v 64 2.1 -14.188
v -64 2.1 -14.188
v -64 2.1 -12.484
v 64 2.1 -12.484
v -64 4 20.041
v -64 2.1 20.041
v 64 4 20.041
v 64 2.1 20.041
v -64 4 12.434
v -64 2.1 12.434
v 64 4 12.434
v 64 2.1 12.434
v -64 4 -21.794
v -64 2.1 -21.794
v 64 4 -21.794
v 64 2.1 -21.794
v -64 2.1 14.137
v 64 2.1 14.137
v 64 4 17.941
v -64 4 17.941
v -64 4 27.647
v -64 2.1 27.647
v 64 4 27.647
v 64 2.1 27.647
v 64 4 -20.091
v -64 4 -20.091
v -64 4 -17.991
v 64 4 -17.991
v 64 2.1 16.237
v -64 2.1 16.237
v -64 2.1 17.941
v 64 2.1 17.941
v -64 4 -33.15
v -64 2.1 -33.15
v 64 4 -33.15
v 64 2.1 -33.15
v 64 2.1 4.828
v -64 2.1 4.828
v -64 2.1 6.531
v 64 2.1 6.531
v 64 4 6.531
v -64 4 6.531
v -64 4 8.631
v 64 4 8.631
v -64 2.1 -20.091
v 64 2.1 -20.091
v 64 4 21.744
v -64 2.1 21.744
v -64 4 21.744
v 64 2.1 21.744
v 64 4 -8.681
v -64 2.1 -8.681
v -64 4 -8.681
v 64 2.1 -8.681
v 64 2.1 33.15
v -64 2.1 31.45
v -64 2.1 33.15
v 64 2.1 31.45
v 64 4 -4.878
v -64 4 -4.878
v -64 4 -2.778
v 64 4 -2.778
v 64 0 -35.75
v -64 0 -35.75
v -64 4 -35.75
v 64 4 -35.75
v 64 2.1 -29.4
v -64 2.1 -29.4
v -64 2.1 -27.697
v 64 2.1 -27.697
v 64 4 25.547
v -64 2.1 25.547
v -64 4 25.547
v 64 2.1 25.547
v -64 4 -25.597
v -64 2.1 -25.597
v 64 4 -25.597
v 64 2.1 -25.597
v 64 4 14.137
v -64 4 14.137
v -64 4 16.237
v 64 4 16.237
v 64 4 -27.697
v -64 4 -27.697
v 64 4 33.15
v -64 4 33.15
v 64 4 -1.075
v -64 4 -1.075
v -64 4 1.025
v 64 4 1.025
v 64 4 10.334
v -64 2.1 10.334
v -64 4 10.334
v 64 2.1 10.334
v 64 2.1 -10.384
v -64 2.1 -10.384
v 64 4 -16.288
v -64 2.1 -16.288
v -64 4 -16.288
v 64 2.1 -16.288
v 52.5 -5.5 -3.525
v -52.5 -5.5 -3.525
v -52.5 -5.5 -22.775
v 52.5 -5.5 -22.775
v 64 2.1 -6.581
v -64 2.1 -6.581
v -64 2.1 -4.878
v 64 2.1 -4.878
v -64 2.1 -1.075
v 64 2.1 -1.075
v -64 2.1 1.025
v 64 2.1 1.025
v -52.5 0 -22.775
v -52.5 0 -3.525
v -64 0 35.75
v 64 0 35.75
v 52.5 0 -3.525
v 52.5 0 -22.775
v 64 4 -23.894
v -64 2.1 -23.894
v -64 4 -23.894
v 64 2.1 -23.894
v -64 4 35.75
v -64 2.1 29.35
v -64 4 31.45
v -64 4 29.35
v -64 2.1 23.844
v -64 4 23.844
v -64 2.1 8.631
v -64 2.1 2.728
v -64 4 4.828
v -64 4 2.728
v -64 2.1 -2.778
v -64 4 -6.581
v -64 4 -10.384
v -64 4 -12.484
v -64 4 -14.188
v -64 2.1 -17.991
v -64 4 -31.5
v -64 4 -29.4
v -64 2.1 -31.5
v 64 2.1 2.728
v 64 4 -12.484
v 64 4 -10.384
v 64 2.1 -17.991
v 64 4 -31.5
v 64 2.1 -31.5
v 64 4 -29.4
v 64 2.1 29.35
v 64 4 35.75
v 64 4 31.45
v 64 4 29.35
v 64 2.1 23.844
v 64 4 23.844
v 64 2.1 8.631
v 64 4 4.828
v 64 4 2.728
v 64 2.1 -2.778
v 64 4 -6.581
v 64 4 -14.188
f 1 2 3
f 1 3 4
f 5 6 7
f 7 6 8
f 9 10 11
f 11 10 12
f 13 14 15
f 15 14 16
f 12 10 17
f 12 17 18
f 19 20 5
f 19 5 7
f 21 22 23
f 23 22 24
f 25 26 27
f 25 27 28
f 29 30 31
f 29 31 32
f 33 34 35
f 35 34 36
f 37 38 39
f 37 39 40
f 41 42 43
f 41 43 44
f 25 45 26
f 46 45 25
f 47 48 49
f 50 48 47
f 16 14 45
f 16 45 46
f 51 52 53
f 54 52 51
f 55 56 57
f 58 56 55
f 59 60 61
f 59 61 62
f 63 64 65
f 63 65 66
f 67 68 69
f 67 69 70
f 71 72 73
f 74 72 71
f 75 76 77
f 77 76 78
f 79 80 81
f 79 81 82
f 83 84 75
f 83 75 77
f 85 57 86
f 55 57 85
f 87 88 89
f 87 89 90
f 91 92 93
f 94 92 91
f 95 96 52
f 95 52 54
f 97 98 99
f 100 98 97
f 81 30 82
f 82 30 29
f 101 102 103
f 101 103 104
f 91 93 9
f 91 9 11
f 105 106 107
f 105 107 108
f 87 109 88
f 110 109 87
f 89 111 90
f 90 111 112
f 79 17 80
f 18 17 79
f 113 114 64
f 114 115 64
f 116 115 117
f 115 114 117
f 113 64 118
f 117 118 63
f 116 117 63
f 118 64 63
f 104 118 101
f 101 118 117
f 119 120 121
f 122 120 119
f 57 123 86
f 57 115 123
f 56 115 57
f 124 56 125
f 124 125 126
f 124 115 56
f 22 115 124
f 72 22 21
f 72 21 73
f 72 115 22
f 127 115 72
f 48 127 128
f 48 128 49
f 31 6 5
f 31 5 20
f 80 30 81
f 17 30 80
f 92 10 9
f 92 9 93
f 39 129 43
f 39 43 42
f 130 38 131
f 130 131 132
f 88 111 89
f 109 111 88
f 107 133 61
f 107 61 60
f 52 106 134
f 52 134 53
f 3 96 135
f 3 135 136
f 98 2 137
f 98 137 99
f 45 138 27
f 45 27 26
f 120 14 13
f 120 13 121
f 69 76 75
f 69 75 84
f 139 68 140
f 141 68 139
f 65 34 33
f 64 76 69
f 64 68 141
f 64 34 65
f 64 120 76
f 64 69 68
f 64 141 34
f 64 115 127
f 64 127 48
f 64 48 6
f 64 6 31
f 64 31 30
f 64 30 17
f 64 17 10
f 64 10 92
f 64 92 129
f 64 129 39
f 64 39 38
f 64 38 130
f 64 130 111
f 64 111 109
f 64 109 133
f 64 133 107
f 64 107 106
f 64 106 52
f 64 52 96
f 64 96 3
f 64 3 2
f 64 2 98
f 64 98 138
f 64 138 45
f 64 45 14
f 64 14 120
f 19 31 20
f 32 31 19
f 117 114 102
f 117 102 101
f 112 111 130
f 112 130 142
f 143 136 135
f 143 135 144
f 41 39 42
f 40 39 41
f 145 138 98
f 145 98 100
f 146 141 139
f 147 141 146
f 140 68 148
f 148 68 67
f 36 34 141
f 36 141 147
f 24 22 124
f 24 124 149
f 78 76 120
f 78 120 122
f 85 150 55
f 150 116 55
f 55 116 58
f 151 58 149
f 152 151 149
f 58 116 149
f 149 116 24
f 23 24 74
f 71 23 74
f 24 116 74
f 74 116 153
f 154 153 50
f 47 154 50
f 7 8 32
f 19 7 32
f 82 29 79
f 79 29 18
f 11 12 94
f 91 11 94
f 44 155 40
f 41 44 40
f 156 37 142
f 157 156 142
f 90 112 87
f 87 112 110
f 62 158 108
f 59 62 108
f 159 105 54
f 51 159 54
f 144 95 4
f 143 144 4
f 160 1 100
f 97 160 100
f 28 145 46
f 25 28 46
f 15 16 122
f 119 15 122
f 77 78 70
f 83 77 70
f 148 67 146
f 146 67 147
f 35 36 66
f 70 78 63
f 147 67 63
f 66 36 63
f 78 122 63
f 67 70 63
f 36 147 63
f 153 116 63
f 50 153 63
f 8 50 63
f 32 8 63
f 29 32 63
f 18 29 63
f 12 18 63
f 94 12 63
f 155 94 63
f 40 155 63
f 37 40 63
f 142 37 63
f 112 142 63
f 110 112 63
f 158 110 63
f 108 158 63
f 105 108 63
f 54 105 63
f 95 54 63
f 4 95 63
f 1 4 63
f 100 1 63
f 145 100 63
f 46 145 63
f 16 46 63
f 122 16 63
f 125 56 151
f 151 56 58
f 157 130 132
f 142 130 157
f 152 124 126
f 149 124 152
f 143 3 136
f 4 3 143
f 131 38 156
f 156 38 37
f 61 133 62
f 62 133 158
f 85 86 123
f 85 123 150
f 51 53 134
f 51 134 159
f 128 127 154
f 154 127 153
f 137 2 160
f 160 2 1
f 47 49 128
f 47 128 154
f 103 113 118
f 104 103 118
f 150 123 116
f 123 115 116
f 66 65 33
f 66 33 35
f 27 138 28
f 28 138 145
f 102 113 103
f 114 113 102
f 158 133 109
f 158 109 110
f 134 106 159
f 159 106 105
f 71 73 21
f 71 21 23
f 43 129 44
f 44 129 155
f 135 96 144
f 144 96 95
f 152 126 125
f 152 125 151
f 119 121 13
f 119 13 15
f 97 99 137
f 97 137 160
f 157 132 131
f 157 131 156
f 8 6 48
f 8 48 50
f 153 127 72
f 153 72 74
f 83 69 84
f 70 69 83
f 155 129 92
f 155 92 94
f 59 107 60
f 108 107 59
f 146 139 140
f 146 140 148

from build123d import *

# Parameters (mm, degrees)
BOSS_EXTRUDE1_DEPTH      = 2.1
BOSS_EXTRUDE1_DEPTH_BACK = 0.0001
SKETCH1_W                = 128
SKETCH1_H                = 71.5
SKETCH2_W                = 128
SKETCH2_H                = 2.6
BOSS_EXTRUDE2_DEPTH      = 1.8999
SKETCH3_W                = 128
SKETCH3_H                = 2.1
BOSS_EXTRUDE3_DEPTH      = 1.8999
LPATTERN1_COUNT          = 17
LPATTERN1_PITCH          = 3.803125
SKETCH6_W                = 105
SKETCH6_H                = 19.25
BOSS_EXTRUDE4_DEPTH      = 5.5


with BuildPart() as part:
    # Sketch1 → Boss-Extrude1 (new, two sides: drawn at the far end of the back side and taken through both)
    with BuildSketch(Plane(origin=(0, 0, 0), x_dir=(1, 0, 0), z_dir=(0, 1, 0)).offset(-BOSS_EXTRUDE1_DEPTH_BACK)):
        Rectangle(SKETCH1_W, SKETCH1_H)
    extrude(amount=BOSS_EXTRUDE1_DEPTH + BOSS_EXTRUDE1_DEPTH_BACK)

    # Sketch2 → Boss-Extrude2 (add)
    with BuildSketch(Plane(origin=(0, 2.1, 0), x_dir=(1, 0, 0), z_dir=(0, 1, 0))):
        with Locations((0, -34.45)):
            Rectangle(SKETCH2_W, SKETCH2_H)
        with Locations((0, 34.45)):
            Rectangle(SKETCH2_W, SKETCH2_H)
    extrude(amount=BOSS_EXTRUDE2_DEPTH)

    # Sketch3 → Boss-Extrude3 (add)
    with BuildSketch(Plane(origin=(0, 2.1, 0), x_dir=(1, 0, 0), z_dir=(0, 1, 0))):
        with Locations((0, -30.4)):
            Rectangle(SKETCH3_W, SKETCH3_H)
    boss_extrude3 = extrude(amount=BOSS_EXTRUDE3_DEPTH)

    # LPattern1: Boss-Extrude3 ×17
    with Locations(*[(0, 0, -i * LPATTERN1_PITCH) for i in range(1, LPATTERN1_COUNT)]):
        add(boss_extrude3)

    # Sketch6 → Boss-Extrude4 (add)
    with BuildSketch(Plane.XZ.offset(0.0001)):
        with Locations((0, -13.15)):
            Rectangle(SKETCH6_W, SKETCH6_H)
    extrude(amount=BOSS_EXTRUDE4_DEPTH)


solid = part.part
